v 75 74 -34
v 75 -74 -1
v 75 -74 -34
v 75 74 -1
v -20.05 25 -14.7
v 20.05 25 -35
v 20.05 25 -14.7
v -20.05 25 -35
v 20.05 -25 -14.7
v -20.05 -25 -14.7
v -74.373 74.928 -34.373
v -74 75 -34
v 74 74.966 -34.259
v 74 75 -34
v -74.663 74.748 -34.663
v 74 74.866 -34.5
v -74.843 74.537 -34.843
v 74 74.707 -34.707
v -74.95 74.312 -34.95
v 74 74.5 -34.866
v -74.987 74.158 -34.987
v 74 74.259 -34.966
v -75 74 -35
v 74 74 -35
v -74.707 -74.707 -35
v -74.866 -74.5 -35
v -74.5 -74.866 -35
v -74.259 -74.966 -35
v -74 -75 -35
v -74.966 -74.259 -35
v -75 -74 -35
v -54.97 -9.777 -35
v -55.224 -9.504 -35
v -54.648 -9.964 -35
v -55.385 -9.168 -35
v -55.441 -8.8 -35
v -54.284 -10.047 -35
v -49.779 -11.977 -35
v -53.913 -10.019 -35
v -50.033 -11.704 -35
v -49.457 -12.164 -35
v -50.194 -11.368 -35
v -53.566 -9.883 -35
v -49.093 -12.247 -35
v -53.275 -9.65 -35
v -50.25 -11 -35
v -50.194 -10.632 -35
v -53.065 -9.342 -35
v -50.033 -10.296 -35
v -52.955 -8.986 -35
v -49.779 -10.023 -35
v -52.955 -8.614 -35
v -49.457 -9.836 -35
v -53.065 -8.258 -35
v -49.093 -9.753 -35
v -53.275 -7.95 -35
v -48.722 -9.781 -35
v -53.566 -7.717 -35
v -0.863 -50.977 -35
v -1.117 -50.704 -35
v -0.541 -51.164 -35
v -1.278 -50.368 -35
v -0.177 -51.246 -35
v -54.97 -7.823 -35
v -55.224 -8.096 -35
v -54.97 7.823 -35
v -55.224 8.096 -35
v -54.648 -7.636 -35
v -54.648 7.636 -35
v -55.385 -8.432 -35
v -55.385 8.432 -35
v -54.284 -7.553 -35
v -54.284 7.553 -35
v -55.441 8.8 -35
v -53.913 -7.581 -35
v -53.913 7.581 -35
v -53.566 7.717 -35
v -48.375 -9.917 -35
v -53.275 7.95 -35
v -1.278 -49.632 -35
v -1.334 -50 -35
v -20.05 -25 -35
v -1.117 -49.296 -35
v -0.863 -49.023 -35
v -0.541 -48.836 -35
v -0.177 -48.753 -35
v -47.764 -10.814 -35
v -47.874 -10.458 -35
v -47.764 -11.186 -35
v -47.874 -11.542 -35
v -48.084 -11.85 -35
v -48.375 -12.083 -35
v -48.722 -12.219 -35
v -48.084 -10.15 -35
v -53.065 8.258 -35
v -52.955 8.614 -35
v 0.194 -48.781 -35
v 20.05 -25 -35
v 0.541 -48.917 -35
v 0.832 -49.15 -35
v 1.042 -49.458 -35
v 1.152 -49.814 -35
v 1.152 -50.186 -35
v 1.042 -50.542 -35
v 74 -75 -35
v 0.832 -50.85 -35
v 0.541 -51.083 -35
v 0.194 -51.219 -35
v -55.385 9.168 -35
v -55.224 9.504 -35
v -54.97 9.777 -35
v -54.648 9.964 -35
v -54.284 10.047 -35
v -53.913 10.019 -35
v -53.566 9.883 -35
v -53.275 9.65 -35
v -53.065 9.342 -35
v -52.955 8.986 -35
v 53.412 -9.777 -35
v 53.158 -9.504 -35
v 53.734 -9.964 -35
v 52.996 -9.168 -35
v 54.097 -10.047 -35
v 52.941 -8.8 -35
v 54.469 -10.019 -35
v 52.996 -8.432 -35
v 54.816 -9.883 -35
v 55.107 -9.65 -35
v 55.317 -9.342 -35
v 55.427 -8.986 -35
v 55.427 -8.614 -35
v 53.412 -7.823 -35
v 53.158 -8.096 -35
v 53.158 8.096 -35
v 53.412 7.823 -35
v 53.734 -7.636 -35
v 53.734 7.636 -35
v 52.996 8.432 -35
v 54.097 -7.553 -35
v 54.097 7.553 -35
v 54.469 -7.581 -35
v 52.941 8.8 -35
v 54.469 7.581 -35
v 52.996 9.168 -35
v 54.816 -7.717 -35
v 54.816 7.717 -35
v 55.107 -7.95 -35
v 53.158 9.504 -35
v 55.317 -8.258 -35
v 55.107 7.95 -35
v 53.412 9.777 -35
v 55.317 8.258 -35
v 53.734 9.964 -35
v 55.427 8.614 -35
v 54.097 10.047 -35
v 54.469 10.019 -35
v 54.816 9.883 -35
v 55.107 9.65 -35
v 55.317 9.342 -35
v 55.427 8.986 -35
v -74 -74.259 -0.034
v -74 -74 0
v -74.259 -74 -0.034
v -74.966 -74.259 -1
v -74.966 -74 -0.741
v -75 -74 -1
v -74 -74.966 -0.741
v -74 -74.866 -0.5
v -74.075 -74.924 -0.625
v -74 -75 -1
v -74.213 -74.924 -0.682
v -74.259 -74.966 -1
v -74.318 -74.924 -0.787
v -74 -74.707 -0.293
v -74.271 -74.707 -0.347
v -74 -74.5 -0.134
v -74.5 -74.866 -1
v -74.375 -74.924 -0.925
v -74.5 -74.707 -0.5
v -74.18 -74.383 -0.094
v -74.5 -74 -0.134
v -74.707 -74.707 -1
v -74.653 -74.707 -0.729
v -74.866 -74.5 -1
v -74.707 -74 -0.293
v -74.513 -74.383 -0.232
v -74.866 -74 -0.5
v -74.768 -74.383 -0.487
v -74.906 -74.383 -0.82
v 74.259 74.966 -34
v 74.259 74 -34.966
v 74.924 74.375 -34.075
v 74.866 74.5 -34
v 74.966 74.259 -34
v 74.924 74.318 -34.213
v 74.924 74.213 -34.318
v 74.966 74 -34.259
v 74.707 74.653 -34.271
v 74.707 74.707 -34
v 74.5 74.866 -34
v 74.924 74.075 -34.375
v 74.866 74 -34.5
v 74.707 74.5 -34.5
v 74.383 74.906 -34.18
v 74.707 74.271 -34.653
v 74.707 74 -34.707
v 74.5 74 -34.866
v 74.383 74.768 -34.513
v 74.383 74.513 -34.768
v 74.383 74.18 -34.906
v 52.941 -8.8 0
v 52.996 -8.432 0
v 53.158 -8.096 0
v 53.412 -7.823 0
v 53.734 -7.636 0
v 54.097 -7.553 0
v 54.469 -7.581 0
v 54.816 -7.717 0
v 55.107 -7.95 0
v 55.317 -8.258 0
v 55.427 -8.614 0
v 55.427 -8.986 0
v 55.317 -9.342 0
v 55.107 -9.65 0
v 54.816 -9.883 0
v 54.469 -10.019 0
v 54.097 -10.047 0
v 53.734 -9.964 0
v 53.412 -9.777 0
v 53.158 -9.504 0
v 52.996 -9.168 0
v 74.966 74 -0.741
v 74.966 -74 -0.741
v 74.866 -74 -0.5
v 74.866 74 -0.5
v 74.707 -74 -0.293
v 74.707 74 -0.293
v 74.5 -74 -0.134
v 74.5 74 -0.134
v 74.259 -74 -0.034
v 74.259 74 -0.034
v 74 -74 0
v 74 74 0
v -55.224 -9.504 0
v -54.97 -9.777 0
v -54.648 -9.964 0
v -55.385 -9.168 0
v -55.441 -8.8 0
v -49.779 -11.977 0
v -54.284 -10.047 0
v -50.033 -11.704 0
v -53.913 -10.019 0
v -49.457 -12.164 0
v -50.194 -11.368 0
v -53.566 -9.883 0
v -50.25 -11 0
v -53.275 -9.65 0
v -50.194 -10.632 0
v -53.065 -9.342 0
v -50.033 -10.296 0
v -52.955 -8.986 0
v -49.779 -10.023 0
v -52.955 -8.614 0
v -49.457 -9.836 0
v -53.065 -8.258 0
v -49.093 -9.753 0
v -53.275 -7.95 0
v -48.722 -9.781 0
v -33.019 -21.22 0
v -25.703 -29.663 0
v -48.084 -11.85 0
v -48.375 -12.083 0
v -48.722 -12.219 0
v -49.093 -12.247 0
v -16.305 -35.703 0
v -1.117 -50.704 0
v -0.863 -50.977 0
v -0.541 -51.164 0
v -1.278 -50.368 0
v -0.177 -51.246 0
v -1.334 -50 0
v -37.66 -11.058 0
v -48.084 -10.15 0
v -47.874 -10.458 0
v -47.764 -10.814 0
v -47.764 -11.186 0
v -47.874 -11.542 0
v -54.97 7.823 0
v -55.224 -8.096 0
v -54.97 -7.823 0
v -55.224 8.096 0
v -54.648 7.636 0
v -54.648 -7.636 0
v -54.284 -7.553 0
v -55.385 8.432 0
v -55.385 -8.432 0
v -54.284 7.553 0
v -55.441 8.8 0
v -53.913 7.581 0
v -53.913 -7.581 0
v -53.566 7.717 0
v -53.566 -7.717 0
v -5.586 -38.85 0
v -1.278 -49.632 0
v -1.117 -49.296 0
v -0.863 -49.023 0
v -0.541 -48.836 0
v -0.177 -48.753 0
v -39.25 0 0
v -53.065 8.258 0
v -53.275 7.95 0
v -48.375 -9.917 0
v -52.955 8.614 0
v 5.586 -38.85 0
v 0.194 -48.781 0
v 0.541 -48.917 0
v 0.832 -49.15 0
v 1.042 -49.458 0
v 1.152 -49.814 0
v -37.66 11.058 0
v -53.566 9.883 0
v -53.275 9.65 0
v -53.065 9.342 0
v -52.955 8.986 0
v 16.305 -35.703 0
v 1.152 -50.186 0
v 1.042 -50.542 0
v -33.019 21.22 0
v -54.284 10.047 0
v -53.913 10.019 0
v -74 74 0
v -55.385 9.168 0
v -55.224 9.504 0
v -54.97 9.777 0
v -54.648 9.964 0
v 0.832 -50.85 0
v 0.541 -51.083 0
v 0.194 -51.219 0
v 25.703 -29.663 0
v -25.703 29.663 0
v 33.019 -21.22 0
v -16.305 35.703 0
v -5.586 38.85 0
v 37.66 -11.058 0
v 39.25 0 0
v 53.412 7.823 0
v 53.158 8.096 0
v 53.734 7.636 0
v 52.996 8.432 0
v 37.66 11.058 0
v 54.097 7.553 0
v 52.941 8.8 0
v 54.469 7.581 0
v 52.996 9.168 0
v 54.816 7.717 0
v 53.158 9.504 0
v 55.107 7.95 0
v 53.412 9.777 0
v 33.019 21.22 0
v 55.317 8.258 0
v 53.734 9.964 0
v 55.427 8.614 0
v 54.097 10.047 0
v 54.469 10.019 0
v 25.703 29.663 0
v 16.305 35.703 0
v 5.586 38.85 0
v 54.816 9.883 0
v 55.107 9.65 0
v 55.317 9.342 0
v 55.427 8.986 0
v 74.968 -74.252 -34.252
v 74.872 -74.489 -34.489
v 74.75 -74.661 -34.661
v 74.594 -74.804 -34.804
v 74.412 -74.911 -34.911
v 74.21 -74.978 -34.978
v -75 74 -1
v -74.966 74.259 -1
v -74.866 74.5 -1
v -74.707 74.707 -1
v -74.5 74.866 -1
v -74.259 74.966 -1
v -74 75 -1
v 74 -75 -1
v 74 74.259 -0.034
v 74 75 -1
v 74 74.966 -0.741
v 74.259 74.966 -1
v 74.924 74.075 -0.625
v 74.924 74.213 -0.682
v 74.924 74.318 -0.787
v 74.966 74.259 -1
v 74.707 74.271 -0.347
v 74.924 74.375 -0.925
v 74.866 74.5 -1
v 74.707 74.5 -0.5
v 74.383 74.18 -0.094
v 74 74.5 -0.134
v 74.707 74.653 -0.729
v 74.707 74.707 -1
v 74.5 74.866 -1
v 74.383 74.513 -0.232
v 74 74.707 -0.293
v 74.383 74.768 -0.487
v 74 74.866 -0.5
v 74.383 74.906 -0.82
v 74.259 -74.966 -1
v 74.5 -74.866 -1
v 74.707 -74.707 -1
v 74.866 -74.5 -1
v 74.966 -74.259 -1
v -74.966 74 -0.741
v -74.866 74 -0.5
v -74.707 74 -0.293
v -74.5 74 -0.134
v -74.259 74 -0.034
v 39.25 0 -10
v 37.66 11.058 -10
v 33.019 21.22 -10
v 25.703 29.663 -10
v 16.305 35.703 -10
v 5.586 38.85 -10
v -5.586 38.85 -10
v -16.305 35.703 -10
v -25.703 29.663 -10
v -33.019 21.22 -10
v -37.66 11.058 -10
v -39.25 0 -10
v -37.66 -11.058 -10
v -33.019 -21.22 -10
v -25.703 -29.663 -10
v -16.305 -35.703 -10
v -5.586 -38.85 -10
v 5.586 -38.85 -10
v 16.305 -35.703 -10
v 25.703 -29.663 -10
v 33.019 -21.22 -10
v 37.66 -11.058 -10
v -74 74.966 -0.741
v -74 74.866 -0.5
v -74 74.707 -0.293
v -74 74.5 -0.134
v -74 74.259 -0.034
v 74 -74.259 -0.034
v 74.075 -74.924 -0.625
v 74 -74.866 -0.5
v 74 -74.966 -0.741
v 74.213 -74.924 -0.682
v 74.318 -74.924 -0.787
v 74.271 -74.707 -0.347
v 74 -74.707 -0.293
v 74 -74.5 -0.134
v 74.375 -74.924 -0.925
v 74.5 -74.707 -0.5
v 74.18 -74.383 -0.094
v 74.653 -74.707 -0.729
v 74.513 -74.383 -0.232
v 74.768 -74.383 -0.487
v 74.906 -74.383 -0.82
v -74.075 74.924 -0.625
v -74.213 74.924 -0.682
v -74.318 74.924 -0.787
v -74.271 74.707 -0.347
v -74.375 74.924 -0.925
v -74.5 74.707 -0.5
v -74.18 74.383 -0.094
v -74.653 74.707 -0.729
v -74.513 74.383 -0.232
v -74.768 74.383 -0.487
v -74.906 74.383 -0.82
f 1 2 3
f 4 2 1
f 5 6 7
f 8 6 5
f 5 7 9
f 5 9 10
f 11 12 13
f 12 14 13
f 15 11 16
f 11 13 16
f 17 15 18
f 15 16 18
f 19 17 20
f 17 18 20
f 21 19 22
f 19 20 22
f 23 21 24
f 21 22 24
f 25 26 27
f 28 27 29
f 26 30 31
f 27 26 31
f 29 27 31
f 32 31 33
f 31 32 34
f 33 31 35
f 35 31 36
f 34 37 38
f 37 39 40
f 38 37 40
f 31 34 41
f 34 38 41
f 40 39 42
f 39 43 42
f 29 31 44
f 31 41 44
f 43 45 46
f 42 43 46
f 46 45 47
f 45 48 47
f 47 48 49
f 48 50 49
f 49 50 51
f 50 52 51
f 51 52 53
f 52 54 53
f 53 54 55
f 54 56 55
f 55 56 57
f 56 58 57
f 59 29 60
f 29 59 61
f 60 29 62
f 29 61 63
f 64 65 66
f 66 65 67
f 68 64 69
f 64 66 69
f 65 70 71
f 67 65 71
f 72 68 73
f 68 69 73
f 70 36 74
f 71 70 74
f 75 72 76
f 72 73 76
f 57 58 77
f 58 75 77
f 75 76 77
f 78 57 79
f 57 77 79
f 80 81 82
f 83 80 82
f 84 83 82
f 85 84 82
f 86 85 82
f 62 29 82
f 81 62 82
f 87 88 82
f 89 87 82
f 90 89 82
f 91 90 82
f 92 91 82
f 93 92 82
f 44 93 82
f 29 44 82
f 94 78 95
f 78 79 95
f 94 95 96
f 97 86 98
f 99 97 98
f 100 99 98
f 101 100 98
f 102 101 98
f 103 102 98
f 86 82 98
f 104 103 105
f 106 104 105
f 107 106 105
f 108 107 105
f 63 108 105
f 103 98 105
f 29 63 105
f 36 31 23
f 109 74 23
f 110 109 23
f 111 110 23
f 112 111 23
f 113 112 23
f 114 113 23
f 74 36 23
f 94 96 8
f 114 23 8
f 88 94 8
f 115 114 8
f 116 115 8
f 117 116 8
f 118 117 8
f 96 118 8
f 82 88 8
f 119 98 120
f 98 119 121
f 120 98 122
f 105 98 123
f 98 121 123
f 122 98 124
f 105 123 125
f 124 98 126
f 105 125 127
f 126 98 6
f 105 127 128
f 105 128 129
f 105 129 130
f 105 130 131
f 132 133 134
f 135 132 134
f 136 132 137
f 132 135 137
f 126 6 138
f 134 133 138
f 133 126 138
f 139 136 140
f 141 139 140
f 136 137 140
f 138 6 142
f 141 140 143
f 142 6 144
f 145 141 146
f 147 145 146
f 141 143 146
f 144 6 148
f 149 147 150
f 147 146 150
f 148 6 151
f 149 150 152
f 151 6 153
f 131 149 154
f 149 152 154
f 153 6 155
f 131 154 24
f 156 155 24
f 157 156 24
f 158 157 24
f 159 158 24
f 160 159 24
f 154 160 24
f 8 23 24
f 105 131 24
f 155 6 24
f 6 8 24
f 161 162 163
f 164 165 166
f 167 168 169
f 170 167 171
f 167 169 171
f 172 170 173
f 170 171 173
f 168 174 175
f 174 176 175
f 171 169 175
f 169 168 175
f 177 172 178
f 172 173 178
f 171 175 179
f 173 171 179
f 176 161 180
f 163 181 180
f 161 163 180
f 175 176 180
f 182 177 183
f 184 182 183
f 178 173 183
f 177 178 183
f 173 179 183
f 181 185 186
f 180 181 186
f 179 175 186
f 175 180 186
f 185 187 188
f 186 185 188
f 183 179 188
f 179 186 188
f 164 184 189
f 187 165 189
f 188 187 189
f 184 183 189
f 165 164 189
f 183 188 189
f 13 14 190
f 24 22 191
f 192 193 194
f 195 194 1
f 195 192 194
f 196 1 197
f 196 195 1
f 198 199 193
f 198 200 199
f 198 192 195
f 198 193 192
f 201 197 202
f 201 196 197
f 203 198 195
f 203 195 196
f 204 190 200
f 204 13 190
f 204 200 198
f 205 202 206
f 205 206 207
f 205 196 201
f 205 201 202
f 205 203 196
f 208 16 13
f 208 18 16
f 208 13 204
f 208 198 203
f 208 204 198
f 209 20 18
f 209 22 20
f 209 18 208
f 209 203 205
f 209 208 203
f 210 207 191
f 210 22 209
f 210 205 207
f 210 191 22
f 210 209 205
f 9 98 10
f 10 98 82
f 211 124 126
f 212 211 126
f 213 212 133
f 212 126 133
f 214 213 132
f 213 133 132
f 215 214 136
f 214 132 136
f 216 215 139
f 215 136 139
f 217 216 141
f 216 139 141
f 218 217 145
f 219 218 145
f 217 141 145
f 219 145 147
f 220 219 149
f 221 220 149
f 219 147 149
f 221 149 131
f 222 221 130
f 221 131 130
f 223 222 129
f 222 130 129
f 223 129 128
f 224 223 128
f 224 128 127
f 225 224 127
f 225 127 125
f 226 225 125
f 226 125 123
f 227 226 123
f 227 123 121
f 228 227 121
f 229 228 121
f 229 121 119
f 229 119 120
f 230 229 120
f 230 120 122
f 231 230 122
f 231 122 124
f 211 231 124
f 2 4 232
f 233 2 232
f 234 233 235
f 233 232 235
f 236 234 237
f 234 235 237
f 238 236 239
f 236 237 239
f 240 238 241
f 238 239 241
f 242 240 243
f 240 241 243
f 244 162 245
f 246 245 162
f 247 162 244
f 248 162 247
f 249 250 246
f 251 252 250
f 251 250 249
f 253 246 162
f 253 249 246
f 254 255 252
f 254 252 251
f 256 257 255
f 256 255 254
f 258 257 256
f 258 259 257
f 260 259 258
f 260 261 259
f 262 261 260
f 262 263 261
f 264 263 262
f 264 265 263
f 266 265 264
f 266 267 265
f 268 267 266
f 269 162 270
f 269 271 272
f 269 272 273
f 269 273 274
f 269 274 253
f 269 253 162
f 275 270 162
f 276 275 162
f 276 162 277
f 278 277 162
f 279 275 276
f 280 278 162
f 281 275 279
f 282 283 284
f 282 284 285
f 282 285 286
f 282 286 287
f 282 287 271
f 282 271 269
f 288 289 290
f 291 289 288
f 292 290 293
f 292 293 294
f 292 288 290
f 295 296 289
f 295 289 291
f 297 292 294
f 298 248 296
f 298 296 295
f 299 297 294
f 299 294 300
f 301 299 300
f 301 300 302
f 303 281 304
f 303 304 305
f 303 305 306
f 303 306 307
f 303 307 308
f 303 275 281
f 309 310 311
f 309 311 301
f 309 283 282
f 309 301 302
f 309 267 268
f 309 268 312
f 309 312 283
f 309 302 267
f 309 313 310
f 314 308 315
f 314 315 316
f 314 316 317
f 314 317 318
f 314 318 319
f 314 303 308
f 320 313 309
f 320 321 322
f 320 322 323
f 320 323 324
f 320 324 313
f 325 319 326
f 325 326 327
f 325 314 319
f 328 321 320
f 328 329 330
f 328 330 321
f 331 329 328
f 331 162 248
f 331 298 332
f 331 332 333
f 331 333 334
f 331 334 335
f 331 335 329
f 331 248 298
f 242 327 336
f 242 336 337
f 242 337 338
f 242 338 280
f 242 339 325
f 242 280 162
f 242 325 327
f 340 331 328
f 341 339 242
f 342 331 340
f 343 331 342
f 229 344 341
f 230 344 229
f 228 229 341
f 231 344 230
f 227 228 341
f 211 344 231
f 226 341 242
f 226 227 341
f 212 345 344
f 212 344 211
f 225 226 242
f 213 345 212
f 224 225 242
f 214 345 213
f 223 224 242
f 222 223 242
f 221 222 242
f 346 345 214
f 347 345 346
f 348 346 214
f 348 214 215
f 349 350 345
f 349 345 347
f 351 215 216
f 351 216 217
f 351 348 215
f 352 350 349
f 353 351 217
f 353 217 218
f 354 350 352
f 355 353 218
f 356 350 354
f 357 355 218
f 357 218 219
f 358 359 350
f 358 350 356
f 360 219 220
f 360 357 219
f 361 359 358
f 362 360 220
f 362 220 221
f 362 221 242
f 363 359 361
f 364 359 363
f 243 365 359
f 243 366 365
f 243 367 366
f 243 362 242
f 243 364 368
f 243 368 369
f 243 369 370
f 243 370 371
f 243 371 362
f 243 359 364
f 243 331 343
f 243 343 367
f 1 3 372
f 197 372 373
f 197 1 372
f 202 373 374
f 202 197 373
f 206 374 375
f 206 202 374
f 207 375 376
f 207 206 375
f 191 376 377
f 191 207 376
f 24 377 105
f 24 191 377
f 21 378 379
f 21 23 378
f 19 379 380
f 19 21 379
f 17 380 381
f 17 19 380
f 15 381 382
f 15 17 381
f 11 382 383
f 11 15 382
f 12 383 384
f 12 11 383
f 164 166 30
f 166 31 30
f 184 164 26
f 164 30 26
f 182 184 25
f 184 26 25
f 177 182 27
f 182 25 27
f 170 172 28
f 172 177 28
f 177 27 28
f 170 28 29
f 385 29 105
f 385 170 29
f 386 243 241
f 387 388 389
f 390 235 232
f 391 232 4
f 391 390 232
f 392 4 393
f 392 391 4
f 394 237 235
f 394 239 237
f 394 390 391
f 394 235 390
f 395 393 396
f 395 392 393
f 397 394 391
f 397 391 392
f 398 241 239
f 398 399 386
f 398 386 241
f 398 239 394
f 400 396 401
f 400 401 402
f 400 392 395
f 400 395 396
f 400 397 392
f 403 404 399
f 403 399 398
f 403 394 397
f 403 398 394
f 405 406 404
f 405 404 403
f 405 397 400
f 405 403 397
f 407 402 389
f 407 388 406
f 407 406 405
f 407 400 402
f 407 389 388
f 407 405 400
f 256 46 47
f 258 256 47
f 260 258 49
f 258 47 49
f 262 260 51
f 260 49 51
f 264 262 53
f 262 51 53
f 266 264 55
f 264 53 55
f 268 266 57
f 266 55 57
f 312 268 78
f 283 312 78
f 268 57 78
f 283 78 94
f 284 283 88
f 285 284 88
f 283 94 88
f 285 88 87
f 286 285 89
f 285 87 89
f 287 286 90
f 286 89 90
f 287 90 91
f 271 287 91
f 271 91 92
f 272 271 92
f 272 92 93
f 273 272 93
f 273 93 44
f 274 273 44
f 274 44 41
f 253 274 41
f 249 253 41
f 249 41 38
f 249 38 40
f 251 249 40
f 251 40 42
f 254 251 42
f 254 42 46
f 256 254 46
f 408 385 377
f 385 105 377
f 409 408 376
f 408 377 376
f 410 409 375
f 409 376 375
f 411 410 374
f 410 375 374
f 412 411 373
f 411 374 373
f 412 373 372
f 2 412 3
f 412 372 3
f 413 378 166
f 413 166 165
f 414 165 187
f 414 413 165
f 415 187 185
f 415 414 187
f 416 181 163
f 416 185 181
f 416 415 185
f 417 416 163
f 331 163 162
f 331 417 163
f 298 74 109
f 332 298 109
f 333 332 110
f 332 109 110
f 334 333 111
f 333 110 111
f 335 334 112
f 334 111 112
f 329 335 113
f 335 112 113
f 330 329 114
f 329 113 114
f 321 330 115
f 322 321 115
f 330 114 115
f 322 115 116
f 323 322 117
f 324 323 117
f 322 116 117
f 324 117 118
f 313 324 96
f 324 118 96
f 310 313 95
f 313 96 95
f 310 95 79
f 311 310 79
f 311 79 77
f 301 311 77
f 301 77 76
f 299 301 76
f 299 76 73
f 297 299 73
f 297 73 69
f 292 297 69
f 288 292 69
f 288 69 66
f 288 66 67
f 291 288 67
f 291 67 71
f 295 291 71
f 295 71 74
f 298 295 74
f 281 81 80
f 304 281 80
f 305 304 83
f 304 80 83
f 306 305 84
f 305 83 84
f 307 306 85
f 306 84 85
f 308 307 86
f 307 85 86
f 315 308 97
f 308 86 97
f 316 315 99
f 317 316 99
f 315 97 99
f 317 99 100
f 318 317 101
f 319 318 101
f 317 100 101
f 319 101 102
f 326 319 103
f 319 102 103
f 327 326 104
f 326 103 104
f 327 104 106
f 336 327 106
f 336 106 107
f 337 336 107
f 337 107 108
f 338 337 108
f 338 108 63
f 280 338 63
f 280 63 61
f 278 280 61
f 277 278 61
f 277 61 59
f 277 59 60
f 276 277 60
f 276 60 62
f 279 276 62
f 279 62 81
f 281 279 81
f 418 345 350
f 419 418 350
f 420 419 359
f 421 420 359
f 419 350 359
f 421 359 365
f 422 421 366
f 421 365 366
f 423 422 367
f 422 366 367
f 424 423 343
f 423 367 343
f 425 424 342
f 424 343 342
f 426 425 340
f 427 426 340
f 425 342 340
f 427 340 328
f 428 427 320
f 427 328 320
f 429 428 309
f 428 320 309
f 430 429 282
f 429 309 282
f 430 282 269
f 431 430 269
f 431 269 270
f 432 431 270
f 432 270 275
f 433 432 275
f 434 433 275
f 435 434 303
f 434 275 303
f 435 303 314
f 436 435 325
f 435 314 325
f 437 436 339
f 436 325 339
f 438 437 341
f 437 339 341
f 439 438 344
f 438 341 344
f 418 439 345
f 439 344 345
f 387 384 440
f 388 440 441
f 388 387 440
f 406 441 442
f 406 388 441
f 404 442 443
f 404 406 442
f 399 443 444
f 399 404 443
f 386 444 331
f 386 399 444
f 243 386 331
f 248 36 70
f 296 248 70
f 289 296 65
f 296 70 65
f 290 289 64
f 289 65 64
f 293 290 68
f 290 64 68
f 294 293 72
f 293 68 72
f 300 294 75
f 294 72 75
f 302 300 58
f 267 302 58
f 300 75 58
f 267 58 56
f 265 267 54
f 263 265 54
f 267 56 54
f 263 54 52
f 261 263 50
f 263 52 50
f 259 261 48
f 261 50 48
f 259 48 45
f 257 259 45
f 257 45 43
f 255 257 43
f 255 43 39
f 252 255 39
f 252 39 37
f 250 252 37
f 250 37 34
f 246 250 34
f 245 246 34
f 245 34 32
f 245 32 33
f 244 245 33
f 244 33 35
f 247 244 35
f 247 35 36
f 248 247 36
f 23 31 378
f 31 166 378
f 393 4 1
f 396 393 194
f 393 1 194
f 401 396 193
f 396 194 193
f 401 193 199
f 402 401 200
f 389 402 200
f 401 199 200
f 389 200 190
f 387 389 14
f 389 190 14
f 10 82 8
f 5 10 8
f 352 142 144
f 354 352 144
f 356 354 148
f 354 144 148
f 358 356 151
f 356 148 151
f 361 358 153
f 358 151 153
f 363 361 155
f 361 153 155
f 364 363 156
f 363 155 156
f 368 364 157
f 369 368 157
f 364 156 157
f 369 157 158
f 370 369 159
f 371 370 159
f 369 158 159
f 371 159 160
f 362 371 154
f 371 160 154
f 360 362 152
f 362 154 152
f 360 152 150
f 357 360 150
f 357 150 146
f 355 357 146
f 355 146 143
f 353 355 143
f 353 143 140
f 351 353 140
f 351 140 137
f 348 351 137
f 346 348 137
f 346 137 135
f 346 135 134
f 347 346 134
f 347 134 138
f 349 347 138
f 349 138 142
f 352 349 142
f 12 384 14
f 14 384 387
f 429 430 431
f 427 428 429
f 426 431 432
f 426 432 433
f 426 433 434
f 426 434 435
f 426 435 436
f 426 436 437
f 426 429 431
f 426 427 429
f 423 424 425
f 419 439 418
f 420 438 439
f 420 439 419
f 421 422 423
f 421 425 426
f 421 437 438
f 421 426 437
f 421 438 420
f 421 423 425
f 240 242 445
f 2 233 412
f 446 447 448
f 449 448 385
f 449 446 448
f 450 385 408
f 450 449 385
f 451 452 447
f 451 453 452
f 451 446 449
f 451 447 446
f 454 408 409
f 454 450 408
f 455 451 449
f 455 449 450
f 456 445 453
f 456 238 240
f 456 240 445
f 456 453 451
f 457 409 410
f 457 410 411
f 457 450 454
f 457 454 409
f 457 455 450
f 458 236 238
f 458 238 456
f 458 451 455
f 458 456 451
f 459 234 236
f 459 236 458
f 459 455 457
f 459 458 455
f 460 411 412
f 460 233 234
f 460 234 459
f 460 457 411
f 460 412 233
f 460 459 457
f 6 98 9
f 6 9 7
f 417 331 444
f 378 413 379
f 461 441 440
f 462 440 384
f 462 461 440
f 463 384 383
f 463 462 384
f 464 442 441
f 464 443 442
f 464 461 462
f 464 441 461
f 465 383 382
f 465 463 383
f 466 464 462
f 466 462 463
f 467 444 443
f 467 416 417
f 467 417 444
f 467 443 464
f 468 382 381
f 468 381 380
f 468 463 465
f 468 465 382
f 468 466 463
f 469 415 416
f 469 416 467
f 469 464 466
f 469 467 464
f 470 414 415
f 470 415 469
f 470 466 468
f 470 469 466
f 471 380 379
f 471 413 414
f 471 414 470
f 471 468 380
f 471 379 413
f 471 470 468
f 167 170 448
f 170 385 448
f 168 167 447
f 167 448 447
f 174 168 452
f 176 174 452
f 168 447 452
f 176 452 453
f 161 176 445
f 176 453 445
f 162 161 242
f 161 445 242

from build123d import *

# Parameters (mm, degrees)
SKETCH1_W                   = 150
SKETCH1_H                   = 150
BOSS_EXTRUDE1_DEPTH         = 35
FILLET1_R                   = 1
SKETCH2_R                   = 39.25
CUT_EXTRUDE4_DEPTH          = 10
TAP_DRILL_FOR_M3X0_5_TAP2_D = 2.5
TAP_DRILL_FOR_M3X0_5_TAP3_D = 2.5
TAP_DRILL_FOR_M3X0_5_TAP5_D = 2.5
SKETCH31_W                  = 40.1
SKETCH31_H                  = 50
CUT_EXTRUDE5_DEPTH          = 20.3


with BuildPart() as part:
    # Sketch1 → Boss-Extrude1 (new body)
    with BuildSketch(Plane.XY):
        Rectangle(SKETCH1_W, SKETCH1_H)
    extrude(amount=-BOSS_EXTRUDE1_DEPTH)

    # Fillet1
    fillet1_edges = [part.edges().sort_by_distance(p)[0] for p in [
        (0, 75, -35),
        (-75, 0, 0),
        (0, 75, 0),
        (75, 0, 0),
        (0, -75, 0),
        (-75, -75, -17.5),
        (-75, 75, -17.5),
        (75, 75, -17.5),
        (75, -75, -17.5),
        (75, 0, -35),
    ]]
    fillet(fillet1_edges, radius=FILLET1_R)

    # Sketch2 → Cut-Extrude4 (cut)
    with BuildSketch(Plane.XY):
        Circle(SKETCH2_R)
    extrude(amount=-CUT_EXTRUDE4_DEPTH, mode=Mode.SUBTRACT)

    # Tap Drill for M3x0.5 Tap2 (through all)
    with Locations(Plane.XY):
        with Locations((-54.190883488, -8.8), (-54.190883488, 8.8), (54.190883488, -8.8), (54.190883488, 8.8)):
            Hole(TAP_DRILL_FOR_M3X0_5_TAP2_D / 2)

    # Tap Drill for M3x0.5 Tap3 (through all)
    with Locations(Plane.XY):
        with Locations((-49, -11)):
            Hole(TAP_DRILL_FOR_M3X0_5_TAP3_D / 2)

    # Tap Drill for M3x0.5 Tap5 (through all)
    with Locations(Plane.XY):
        with Locations((-0.083892693, -49.999977478)):
            Hole(TAP_DRILL_FOR_M3X0_5_TAP5_D / 2)

    # Sketch31 → Cut-Extrude5 (cut)
    with BuildSketch(Plane(origin=(0, 0, -35), x_dir=(-1, 0, 0), z_dir=(0, 0, -1))):
        Rectangle(SKETCH31_W, SKETCH31_H)
    extrude(amount=-CUT_EXTRUDE5_DEPTH, mode=Mode.SUBTRACT)


solid = part.part
